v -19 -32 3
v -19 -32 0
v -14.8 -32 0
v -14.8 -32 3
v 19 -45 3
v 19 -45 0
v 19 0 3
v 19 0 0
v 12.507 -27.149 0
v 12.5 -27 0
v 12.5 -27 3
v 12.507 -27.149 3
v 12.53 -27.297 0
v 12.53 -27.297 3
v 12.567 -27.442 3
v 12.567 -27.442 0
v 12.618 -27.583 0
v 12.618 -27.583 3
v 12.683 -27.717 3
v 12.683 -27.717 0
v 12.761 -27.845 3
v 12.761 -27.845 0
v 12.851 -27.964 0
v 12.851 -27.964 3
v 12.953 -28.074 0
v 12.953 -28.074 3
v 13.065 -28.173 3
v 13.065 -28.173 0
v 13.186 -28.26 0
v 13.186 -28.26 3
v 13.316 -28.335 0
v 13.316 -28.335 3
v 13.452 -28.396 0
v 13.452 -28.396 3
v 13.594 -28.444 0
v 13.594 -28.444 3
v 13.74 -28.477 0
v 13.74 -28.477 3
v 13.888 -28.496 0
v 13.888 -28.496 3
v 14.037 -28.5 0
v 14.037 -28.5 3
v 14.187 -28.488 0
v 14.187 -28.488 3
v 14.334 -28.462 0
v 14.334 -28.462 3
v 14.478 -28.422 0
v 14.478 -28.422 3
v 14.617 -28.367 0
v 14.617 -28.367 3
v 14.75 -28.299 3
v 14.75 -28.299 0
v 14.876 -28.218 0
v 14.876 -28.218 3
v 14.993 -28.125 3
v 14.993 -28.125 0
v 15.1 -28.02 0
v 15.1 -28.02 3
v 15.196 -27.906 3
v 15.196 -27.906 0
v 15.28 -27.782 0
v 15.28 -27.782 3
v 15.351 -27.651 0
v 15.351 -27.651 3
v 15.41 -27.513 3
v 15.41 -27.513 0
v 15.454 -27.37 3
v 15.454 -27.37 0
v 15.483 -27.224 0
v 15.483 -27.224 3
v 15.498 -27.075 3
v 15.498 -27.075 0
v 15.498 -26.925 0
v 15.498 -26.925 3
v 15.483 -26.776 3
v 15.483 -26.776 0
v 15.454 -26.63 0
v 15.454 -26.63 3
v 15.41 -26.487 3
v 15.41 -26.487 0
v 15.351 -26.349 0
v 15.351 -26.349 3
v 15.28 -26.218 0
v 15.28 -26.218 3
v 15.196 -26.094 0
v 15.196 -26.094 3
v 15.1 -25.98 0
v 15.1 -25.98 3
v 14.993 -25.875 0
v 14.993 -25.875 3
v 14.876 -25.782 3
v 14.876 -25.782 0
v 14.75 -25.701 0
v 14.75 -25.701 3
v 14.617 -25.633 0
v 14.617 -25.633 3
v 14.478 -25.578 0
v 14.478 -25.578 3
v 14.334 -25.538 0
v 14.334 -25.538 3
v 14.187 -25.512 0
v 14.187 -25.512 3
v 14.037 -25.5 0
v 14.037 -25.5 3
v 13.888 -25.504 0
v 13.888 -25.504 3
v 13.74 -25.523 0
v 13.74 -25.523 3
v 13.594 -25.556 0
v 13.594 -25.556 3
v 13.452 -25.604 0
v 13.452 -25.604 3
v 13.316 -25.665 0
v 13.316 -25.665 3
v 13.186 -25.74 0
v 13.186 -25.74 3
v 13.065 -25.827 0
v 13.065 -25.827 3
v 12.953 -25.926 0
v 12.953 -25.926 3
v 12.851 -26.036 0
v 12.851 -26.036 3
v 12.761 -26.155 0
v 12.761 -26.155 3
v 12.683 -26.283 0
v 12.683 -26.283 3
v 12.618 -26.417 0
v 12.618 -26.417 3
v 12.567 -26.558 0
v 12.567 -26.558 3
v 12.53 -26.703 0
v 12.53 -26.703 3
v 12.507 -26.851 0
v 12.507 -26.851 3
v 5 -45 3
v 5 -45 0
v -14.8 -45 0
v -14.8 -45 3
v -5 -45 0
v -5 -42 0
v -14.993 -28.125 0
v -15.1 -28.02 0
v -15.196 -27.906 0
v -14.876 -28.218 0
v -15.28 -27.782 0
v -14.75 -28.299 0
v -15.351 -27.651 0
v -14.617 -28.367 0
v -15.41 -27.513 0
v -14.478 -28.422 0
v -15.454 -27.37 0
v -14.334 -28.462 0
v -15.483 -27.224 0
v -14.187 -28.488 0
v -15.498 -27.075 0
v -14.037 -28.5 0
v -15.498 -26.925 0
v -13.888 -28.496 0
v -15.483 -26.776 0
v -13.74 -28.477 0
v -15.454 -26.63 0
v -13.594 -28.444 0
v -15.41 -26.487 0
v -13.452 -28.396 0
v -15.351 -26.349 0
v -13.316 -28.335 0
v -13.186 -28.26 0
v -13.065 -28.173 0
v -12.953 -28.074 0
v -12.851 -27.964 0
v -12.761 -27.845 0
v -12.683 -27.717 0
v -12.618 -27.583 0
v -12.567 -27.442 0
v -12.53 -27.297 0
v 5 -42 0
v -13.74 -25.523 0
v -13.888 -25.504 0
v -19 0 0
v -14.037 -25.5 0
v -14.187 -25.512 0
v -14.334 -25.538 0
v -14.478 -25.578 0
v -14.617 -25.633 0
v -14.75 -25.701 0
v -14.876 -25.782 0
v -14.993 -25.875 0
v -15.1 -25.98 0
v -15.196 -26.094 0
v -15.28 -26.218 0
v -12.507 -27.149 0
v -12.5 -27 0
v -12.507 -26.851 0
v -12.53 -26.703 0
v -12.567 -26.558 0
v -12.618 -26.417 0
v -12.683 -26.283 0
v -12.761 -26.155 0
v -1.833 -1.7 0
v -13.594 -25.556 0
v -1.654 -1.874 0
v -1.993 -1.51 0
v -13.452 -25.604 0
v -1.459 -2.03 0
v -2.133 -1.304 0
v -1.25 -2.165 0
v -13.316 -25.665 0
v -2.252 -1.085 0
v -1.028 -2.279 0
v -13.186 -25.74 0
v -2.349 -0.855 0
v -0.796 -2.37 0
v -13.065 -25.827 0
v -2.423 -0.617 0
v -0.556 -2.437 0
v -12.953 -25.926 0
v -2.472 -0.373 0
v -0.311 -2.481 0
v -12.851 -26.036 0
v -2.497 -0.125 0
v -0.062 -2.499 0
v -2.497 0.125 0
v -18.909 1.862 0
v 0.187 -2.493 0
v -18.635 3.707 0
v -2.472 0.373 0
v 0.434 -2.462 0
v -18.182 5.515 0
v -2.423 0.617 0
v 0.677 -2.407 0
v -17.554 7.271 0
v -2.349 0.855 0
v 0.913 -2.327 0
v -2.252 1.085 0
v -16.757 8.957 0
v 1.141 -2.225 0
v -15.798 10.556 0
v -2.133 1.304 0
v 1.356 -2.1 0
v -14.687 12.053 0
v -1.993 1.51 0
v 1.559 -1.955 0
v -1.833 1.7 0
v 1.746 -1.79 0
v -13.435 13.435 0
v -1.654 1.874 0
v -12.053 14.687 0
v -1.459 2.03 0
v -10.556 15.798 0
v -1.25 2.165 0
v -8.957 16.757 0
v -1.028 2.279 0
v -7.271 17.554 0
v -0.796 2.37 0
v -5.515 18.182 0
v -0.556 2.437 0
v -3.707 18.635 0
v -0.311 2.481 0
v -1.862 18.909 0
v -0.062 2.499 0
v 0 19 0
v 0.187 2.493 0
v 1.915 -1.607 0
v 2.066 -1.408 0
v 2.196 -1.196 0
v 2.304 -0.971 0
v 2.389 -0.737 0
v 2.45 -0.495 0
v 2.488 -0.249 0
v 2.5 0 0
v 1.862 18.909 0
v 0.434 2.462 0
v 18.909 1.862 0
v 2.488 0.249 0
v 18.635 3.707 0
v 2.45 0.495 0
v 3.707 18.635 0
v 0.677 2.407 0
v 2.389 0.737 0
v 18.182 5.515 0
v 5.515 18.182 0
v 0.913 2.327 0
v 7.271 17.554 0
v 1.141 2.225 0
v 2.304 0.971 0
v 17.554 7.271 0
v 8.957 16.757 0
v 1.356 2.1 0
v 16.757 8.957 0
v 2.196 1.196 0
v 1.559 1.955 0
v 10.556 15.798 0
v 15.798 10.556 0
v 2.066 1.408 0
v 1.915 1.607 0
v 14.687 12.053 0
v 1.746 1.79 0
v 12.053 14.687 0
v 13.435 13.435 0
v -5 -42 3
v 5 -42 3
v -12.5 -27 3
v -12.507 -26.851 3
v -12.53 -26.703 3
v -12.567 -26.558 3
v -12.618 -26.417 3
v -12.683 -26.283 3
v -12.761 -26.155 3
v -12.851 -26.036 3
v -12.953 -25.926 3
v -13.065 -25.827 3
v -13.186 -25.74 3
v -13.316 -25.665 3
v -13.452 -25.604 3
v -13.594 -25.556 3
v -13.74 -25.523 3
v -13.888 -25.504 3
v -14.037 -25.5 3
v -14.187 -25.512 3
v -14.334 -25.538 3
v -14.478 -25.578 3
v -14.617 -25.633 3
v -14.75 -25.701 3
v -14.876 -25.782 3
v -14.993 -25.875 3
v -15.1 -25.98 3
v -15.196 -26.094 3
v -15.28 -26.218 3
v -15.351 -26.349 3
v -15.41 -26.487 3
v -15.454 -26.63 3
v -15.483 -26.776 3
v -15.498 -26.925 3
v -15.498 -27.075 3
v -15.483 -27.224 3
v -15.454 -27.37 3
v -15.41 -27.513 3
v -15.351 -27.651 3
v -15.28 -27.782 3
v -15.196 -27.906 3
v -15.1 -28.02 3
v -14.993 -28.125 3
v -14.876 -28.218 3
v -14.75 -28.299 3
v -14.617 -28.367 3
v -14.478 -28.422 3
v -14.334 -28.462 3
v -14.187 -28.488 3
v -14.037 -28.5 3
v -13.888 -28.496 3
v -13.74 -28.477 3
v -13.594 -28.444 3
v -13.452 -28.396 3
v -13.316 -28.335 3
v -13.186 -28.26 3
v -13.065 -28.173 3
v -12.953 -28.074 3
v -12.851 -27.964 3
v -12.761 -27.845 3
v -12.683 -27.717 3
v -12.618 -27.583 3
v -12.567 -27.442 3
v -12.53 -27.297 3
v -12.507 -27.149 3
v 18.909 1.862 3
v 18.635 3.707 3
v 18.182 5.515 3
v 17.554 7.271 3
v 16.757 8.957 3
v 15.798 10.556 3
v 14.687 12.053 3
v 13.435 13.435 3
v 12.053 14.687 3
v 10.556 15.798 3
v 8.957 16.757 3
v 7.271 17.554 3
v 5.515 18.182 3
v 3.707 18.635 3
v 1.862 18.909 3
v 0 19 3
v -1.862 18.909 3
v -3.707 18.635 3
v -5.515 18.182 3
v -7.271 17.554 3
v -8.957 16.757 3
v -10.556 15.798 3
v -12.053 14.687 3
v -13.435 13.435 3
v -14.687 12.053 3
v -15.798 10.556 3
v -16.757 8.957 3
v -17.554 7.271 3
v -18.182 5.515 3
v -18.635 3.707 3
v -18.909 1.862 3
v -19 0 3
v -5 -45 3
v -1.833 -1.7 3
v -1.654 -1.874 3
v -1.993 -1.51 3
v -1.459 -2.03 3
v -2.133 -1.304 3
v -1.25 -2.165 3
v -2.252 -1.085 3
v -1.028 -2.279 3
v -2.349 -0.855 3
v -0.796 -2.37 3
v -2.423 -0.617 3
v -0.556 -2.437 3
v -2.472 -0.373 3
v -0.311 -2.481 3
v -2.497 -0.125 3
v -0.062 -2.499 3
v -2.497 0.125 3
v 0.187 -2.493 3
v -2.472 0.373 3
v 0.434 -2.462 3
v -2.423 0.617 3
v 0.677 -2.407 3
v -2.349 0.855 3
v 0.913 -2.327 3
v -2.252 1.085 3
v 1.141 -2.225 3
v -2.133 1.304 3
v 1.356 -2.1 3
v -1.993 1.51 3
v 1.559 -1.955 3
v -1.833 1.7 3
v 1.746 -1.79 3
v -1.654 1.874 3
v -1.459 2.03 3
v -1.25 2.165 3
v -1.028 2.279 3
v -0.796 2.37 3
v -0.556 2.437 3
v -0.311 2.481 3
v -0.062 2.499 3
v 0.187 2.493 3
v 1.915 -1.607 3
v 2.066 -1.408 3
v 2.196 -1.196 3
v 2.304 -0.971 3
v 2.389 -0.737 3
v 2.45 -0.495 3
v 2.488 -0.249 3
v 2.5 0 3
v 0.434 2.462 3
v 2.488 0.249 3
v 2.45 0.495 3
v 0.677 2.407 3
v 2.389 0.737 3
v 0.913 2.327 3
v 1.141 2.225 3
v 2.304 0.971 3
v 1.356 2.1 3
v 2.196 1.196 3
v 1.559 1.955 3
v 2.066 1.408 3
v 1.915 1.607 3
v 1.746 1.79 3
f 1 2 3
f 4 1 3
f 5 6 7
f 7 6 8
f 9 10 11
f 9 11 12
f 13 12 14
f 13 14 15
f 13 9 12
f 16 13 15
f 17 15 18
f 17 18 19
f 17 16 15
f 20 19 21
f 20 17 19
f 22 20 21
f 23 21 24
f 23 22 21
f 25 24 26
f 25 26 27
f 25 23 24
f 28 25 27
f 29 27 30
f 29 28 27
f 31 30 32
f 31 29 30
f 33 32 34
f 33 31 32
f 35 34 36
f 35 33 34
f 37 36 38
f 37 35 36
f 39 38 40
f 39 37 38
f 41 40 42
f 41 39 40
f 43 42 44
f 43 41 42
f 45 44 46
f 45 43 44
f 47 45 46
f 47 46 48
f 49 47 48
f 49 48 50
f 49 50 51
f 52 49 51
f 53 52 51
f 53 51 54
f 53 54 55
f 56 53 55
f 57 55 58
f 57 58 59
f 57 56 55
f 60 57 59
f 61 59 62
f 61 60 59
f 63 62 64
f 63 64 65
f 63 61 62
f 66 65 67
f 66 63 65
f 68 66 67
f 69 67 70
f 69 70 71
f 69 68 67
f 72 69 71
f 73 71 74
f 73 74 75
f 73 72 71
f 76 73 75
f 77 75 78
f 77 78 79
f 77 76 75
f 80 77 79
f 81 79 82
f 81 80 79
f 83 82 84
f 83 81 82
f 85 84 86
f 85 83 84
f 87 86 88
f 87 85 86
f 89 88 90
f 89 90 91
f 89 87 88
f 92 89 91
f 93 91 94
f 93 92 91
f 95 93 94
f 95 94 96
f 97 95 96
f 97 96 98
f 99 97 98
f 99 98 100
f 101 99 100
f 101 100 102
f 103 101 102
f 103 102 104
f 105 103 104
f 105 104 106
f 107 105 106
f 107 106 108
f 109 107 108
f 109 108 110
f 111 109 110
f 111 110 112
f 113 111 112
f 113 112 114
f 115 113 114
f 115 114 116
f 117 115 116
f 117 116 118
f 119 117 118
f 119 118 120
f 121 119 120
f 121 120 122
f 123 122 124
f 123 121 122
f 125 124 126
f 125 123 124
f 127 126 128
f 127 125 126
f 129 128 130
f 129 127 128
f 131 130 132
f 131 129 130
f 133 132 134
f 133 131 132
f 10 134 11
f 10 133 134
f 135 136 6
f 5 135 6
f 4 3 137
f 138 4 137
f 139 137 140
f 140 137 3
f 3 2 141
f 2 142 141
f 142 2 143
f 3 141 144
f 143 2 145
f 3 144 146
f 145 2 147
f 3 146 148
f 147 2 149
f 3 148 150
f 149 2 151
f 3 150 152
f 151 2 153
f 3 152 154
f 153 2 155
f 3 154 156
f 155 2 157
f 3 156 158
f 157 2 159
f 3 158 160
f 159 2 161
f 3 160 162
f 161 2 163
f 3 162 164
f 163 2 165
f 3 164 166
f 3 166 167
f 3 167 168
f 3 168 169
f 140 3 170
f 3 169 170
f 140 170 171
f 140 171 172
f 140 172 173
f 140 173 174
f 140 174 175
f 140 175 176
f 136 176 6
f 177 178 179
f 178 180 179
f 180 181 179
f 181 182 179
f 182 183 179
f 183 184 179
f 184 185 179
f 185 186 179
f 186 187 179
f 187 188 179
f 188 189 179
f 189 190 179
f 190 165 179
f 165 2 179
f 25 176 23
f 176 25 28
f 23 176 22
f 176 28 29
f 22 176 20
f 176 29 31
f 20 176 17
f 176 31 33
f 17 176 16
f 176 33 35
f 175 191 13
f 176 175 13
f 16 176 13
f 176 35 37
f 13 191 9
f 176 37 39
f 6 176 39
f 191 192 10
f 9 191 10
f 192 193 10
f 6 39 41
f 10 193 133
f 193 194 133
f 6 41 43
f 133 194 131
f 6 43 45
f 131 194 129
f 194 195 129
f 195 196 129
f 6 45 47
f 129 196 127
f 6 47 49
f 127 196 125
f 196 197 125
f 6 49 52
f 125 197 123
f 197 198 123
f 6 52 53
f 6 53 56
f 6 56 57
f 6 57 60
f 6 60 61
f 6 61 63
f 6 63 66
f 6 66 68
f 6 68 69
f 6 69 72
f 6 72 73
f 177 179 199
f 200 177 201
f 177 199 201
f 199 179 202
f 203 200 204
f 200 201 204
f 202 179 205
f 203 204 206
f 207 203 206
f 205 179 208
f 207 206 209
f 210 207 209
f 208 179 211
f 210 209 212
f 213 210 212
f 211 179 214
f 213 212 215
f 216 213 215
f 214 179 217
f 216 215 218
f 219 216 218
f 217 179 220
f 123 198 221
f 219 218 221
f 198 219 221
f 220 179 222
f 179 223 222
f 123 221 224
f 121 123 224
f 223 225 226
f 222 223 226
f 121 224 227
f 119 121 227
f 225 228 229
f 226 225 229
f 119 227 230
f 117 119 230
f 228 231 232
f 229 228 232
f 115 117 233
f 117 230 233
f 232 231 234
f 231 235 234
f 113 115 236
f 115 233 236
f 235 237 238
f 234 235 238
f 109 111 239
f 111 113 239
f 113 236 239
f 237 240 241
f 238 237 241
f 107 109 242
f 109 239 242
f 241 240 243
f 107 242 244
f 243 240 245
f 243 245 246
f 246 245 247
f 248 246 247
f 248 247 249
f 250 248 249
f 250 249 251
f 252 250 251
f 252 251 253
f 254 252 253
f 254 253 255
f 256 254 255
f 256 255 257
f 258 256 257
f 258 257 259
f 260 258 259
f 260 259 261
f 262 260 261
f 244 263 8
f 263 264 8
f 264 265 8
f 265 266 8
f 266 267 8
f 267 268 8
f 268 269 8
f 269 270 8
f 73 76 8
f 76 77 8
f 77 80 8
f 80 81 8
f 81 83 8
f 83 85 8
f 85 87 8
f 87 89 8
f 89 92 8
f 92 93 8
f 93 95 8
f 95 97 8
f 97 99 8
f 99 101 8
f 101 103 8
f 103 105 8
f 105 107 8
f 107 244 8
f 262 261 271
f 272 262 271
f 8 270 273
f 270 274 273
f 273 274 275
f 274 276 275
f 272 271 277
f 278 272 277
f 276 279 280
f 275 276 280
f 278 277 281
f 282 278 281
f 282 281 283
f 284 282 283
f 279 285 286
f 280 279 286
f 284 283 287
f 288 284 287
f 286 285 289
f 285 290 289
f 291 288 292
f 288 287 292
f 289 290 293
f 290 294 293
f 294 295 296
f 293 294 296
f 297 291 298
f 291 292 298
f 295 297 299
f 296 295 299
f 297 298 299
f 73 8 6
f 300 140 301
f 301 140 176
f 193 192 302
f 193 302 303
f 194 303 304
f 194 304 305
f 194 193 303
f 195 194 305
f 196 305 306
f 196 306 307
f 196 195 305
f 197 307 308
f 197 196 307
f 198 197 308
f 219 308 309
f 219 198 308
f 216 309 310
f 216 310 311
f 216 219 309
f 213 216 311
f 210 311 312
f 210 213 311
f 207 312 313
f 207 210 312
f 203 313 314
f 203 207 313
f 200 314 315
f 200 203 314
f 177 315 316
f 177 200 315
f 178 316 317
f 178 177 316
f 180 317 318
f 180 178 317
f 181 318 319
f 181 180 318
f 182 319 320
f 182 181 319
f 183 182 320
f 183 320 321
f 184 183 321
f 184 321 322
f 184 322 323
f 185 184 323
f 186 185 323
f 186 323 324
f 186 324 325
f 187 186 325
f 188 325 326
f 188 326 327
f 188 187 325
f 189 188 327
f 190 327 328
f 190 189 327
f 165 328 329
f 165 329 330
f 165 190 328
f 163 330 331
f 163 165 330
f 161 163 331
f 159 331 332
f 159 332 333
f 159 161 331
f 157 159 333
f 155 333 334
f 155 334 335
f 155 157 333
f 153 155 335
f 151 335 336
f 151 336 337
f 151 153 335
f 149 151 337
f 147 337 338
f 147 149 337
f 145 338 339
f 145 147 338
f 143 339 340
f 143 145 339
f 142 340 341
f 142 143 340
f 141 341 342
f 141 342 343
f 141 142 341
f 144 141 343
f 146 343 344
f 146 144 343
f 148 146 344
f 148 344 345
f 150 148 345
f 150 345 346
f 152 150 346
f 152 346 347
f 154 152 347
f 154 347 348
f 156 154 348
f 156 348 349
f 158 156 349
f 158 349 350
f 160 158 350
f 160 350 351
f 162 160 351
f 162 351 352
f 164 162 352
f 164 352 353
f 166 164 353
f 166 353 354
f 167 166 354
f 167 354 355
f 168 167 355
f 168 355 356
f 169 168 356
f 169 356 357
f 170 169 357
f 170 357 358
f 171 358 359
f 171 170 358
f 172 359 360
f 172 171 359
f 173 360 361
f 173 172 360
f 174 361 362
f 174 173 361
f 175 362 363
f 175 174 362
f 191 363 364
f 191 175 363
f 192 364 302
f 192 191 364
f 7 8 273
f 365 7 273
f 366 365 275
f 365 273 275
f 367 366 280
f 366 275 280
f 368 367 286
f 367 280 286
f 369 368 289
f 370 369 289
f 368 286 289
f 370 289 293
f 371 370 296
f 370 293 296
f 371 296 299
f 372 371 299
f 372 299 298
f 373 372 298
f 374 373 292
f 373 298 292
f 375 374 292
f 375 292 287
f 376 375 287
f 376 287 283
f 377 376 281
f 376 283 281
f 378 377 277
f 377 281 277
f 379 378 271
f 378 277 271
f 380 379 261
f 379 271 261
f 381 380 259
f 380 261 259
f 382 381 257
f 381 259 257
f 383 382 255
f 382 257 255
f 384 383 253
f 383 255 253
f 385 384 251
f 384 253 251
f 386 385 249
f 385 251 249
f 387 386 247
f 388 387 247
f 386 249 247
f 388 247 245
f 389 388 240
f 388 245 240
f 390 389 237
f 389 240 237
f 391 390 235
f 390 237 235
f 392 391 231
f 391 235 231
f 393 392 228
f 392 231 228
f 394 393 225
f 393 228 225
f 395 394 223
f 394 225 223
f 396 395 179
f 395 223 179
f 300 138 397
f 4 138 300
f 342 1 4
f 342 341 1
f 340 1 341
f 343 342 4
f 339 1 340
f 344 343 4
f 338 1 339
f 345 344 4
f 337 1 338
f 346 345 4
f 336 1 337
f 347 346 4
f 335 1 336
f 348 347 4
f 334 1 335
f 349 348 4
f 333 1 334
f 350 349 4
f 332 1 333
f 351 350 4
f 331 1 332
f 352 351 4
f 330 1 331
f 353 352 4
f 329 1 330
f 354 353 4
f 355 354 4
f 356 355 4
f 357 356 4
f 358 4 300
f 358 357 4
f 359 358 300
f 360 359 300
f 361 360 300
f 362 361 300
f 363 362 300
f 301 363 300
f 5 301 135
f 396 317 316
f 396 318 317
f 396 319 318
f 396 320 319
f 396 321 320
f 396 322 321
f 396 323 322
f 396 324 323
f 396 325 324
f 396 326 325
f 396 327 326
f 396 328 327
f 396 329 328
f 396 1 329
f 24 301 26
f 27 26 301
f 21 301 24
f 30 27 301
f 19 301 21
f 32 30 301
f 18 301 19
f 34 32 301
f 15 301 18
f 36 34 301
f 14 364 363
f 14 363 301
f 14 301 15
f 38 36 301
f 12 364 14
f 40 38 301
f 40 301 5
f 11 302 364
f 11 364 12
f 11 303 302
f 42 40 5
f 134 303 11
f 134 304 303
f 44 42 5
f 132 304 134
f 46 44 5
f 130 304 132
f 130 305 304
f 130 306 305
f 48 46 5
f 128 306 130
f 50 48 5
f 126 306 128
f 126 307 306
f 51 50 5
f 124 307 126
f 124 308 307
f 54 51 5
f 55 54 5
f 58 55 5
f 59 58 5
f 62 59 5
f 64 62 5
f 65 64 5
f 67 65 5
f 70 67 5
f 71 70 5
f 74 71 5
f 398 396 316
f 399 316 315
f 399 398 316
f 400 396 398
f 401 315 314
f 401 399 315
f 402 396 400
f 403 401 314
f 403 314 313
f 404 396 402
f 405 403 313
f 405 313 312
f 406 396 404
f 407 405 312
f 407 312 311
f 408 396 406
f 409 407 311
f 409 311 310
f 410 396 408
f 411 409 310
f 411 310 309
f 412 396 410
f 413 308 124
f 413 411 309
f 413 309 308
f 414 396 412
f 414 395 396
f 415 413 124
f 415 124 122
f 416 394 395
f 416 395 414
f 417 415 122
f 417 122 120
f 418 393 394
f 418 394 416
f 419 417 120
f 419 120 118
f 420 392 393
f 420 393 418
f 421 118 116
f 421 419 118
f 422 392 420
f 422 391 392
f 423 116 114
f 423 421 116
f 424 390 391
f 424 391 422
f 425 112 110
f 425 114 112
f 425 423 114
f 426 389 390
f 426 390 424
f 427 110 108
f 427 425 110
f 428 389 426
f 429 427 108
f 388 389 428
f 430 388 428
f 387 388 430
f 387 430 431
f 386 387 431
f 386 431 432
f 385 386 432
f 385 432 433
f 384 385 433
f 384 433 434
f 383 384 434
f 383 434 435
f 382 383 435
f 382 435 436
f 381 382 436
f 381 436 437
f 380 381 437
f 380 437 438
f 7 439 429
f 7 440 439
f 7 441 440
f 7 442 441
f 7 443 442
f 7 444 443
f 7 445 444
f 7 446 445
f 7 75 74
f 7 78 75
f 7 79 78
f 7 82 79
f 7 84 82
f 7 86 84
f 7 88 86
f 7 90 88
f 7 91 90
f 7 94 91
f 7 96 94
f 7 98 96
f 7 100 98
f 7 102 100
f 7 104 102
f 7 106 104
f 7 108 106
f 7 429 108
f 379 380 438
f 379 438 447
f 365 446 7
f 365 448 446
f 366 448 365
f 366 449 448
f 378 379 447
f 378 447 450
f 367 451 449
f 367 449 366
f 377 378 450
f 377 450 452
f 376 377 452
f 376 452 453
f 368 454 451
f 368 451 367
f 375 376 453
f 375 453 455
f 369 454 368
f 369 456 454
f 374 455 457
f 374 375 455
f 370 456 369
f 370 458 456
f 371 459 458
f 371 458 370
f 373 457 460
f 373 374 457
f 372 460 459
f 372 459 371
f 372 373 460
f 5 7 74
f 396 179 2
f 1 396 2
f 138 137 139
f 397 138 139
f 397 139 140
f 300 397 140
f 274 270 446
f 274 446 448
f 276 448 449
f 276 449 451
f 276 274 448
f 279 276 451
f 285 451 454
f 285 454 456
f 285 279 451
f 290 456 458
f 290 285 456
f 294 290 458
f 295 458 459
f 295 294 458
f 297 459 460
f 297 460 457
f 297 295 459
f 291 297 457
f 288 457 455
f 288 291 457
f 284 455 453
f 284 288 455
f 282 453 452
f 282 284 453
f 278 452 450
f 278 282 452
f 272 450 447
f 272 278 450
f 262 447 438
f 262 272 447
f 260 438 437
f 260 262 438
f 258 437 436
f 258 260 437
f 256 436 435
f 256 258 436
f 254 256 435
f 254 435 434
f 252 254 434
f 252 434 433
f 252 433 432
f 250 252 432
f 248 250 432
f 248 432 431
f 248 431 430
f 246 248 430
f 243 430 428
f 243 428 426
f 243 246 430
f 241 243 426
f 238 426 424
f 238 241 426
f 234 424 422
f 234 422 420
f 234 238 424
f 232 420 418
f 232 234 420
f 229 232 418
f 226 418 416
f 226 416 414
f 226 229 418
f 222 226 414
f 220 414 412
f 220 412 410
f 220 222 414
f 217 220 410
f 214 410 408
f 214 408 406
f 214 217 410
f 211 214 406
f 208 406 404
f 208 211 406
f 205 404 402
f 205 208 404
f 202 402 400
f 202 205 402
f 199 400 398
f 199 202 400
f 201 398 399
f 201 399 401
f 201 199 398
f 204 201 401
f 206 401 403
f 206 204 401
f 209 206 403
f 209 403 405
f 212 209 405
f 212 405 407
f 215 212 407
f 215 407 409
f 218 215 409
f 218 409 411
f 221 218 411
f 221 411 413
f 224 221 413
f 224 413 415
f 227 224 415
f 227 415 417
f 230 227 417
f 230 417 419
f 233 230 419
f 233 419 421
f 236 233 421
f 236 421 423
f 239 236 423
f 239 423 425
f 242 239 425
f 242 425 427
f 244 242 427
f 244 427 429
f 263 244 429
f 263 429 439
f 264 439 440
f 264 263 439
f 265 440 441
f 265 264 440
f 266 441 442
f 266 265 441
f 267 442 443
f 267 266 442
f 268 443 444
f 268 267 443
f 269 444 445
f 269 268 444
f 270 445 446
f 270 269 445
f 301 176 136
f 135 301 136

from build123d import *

# Parameters (mm, degrees)
SKETCH1_R           = 2.5
SKETCH1_R_2         = 1.5
BOSS_EXTRUDE1_DEPTH = 3


with BuildPart() as part:
    # Sketch1 → Boss-Extrude1 (new body)
    with BuildSketch(Plane.XY):
        with BuildLine():
            Line((-19, 0), (-19, -32))
            Line((-19, -32), (-14.8, -32))
            Line((-14.8, -32), (-14.8, -45))
            Line((-14.8, -45), (-5, -45))
            Line((-5, -45), (-5, -42))
            Line((-5, -42), (5, -42))
            Line((5, -42), (5, -45))
            Line((5, -45), (19, -45))
            Line((19, -45), (19, 0))
            ThreePointArc((19, 0), (0, 19), (-19, 0))
        make_face()
        Circle(SKETCH1_R, mode=Mode.SUBTRACT)
        with Locations((-14, -27)):
            Circle(SKETCH1_R_2, mode=Mode.SUBTRACT)
        with Locations(Location((14, -27, 0), (0, 0, 180))):
            Circle(SKETCH1_R_2, mode=Mode.SUBTRACT)
    extrude(amount=BOSS_EXTRUDE1_DEPTH)


solid = part.part
